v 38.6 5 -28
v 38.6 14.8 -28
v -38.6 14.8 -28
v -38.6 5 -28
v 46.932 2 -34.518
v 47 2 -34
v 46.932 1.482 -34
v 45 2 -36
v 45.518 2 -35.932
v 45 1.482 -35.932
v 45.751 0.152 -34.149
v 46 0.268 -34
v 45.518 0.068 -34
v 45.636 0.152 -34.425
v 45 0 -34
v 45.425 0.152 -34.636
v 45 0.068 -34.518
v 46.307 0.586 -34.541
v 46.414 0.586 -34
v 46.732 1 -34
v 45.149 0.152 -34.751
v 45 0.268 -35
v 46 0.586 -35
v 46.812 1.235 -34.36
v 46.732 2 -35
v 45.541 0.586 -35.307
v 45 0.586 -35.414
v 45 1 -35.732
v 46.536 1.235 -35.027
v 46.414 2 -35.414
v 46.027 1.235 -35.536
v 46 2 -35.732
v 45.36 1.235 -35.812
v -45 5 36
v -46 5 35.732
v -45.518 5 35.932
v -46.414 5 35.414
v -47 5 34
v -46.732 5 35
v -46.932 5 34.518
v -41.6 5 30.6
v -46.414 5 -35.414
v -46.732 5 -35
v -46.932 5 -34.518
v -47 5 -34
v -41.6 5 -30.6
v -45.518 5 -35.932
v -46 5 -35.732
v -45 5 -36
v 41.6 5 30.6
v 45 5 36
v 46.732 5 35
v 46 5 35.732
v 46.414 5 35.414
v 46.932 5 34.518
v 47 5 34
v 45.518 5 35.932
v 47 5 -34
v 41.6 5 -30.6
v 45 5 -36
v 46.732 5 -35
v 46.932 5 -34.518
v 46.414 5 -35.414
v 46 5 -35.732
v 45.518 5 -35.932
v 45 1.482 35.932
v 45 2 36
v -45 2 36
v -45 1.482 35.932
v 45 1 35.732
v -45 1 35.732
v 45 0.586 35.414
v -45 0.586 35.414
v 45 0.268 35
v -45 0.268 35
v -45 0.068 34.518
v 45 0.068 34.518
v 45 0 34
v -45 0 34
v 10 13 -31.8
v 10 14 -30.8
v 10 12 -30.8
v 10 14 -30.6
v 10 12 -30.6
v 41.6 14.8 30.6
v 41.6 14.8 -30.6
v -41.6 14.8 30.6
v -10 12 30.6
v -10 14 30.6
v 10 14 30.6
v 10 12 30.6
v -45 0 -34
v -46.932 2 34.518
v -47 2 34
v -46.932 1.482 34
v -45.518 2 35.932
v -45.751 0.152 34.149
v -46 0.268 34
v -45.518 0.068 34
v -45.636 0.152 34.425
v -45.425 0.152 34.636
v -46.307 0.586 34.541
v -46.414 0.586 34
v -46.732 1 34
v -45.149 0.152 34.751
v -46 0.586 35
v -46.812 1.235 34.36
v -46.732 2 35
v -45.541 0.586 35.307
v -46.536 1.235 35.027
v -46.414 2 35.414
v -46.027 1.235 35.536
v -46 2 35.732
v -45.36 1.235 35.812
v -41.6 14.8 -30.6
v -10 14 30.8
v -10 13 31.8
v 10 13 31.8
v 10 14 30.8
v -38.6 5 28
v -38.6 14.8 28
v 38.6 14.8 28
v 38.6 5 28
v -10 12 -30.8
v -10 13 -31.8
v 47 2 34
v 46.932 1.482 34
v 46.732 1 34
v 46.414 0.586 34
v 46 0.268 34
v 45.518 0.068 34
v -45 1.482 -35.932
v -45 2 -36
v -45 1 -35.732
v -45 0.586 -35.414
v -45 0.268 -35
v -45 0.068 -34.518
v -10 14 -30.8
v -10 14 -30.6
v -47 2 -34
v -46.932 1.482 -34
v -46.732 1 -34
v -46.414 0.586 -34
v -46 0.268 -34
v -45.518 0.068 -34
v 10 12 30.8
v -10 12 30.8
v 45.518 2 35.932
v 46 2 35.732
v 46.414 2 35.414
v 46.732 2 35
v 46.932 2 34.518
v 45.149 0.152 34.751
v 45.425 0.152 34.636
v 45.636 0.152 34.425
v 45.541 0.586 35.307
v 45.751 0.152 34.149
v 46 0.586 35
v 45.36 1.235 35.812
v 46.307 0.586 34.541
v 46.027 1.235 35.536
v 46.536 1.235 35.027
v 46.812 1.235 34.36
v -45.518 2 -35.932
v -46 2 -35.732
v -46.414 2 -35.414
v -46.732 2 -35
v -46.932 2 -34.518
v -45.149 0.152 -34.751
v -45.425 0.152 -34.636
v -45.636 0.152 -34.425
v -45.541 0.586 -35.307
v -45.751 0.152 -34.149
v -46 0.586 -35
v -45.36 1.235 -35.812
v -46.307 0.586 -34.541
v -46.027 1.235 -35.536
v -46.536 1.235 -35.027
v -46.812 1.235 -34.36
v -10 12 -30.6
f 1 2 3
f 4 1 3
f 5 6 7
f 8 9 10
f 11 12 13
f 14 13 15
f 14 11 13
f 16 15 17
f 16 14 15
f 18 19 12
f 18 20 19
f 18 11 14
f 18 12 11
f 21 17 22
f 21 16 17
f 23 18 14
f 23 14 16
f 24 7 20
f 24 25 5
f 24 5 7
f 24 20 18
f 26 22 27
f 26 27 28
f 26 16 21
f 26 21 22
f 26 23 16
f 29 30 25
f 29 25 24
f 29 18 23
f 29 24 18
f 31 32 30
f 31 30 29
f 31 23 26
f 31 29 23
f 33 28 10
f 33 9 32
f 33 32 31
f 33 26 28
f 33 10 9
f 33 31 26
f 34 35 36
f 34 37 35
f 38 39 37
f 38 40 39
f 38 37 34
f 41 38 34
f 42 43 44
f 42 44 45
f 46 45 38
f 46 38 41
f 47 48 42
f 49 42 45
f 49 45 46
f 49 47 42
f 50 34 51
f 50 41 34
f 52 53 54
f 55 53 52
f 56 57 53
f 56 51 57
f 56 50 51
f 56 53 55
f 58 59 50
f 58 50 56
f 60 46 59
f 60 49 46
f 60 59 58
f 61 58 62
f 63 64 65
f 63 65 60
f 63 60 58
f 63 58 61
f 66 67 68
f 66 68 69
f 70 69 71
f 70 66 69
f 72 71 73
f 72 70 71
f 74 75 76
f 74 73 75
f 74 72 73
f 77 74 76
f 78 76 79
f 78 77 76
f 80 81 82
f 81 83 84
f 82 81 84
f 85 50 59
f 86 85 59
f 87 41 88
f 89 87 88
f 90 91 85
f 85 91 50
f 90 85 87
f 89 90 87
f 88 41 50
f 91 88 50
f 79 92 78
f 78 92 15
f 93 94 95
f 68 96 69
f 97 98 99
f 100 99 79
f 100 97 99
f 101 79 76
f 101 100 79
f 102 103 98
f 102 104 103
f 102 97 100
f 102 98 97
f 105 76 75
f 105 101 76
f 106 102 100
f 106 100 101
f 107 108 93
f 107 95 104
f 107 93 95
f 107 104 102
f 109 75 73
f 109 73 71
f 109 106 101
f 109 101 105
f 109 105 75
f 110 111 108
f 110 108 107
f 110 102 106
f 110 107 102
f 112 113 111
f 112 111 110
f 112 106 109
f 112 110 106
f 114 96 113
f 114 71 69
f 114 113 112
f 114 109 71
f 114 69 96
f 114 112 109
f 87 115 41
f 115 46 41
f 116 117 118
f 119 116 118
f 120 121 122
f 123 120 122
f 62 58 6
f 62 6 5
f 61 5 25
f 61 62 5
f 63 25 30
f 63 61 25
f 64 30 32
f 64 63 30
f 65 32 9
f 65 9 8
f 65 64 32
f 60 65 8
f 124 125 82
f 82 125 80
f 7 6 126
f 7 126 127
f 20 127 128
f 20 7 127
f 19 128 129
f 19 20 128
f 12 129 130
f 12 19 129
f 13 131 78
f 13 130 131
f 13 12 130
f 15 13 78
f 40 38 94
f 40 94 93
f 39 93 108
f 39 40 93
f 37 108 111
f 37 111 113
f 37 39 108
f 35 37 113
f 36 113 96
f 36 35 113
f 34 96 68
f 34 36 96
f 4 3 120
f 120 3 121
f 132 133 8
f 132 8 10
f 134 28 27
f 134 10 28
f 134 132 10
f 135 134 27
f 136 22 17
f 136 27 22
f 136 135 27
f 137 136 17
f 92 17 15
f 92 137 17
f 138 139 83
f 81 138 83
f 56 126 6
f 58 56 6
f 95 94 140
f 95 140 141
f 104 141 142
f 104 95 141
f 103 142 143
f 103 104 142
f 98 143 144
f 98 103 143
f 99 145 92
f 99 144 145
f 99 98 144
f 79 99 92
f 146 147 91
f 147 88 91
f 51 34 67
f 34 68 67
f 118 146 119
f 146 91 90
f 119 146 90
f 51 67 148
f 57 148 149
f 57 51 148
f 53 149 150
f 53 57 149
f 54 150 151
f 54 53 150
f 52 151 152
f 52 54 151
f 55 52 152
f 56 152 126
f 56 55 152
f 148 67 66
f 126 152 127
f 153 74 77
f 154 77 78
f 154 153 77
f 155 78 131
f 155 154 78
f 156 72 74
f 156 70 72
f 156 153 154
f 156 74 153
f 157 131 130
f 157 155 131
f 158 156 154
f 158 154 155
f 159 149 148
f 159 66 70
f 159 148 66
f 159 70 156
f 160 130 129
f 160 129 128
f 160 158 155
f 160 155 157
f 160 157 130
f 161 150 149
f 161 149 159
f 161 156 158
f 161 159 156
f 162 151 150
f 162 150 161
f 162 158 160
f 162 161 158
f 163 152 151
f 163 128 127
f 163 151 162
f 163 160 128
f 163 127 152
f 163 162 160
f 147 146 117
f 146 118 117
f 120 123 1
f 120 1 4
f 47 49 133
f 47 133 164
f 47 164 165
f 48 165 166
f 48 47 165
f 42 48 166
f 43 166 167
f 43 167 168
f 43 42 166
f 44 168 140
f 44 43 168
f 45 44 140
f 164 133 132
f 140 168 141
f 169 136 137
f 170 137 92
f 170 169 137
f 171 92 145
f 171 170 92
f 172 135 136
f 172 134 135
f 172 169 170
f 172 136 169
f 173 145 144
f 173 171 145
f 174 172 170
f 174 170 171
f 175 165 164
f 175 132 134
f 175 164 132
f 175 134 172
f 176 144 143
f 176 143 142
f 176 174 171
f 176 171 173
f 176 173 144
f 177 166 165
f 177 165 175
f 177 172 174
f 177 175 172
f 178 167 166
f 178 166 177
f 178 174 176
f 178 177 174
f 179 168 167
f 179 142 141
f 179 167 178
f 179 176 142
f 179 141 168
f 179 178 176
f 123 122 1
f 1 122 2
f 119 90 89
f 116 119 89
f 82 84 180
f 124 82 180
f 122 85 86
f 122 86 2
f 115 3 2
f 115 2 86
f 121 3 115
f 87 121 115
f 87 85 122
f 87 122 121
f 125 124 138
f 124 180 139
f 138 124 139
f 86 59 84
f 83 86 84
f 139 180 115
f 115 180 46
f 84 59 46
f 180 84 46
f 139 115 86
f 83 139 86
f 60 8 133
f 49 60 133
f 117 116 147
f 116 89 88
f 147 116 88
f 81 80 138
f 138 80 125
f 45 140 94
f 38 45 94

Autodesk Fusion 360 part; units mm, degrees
sketch "Sketch1" plane through (0, 0, 0) normal (0, 1, 0) x (1, 0, 0)
  line L0 (47, 36) -> (-47, 36)
  line L1 (-47, 36) -> (-47, -36)
  line L2 (-47, -36) -> (47, -36)
  line L3 (47, -36) -> (47, 36)
  line L4 (47, 36) -> (-47, -36) construction
  line L5 (-47, 36) -> (47, -36) construction
  dimension "d1" = 72
  dimension "d2" = 94
extrude "Extrude1" add sketch "Sketch1" along normal blind 5
sketch "Sketch2" plane through (0, 5, 0) normal (0, 1, 0) x (-1, 0, 0)
  line L0 (-47, 36) -> (-47, -36)
  line L1 (-47, -36) -> (47, -36)
  line L2 (47, -36) -> (47, 36)
  line L3 (47, 36) -> (-47, 36)
  line L4 (-41.6, -30.6) -> (41.6, -30.6)
  line L5 (41.6, -30.6) -> (41.6, 30.6)
  line L6 (41.6, 30.6) -> (-41.6, 30.6)
  line L7 (-41.6, 30.6) -> (-41.6, -30.6)
  line L8 (-41.6, -30.6) -> (41.6, 30.6) construction
  line L9 (41.6, -30.6) -> (-41.6, 30.6) construction
  dimension "d5" = 83.2
  dimension "d6" = 61.2
extrude "Extrude2" add sketch "Sketch2" along normal blind 9.8 contours L4 L5 L6 L7
fillet "Fillet1" radius 2 4 edges at (47, 2.5, -36) (47, 2.5, 36) (-47, 2.5, 36) (-47, 2.5, -36)
fillet "Fillet2" radius 2 8 edges at (0, 0, -36) (-46.4142, 0, -35.4142) (-47, 0, 0) (-46.4142, 0, 35.4142) (0, 0, 36) (46.4142, 0, 35.4142) (47, 0, 0) (46.4142, 0, -35.4142)
sketch "Sketch3" plane through (0, 14.8, 0) normal (0, 1, 0) x (-1, 0, 0)
  line L0 (-41.6, 30.6) -> (-41.6, -30.6)
  line L1 (-41.6, -30.6) -> (41.6, -30.6)
  line L2 (41.6, -30.6) -> (41.6, 30.6)
  line L3 (41.6, 30.6) -> (-41.6, 30.6)
  line L4 (-38.6, -28) -> (38.6, -28)
  line L5 (38.6, -28) -> (38.6, 28)
  line L6 (38.6, 28) -> (-38.6, 28)
  line L7 (-38.6, 28) -> (-38.6, -28)
  line L8 (-38.6, -28) -> (38.6, 28) construction
  line L9 (38.6, -28) -> (-38.6, 28) construction
  line L10 (-45, -34) -> (45, -34)
  dimension "d11" = 56
  dimension "d12" = 77.2
  dimension "d13" = 90
extrude "Extrude3" cut sketch "Sketch3" against normal blind 9.8 contours L4 L5 L6 L7
sketch "Sketch4" plane through (0, 0, -30.6) normal (0, 0, -1) x (-1, 0, 0)
  line L0 (-41.6, 5) -> (41.6, 5)
  line L1 (41.6, 5) -> (41.6, 14.8)
  line L2 (41.6, 14.8) -> (-41.6, 14.8)
  line L3 (-41.6, 14.8) -> (-41.6, 5)
  line L4 (10, 14) -> (-10, 14)
  line L5 (-10, 14) -> (-10, 12)
  line L6 (-10, 12) -> (10, 12)
  line L7 (10, 12) -> (10, 14)
  line L8 (10, 14) -> (-10, 12) construction
  line L9 (-10, 14) -> (10, 12) construction
  point P0 (0, 13)
  dimension "d16" = 20
  dimension "d17" = 2
extrude "Extrude4" add sketch "Sketch4" along normal blind 1.2 contours L4 L5 L6 L7
sketch "Sketch5" plane through (10, 0, 0) normal (1, 0, 0) x (0, 0, -1)
  line L0 (30.6, 14) -> (30.6, 12)
  line L1 (30.6, 12) -> (31.8, 12)
  line L2 (31.8, 12) -> (31.8, 14)
  line L3 (31.8, 14) -> (30.6, 14)
  point P0 (31.8, 14)
  point P1 (31.8, 12)
  point P2 (31.8, 12)
  point P3 (31.8, 12)
  point P4 (31.8, 12)
  point P5 (31.8, 12)
  point P6 (31.8, 14)
  point P7 (31.8, 14)
  point P8 (31.8, 14)
  point P9 (31.8, 14)
  point P10 (31.8, 14)
  point P11 (31.8, 14)
  point P12 (31.8, 14)
  point P13 (31.8, 14)
  point P14 (31.8, 14)
  point P15 (31.8, 14)
  point P16 (31.8, 12)
  point P17 (31.8, 14)
  point P18 (31.8, 12)
  point P19 (31.8, 14)
ref_plane "WorkPlane2" through (0, 9.9, 0) normal (0, 0, 1) x (-1, 0, 0)
ref_plane "WorkPlane1" through (0, 9.9, 30.6) normal (0, 0, 1) x (1, 0, 0)
ref_plane "WorkPlane3" through (0, 13, -26.8) normal (0, 0, -1) x (-1, 0, 0)
ref_plane "WorkPlane4" through (0, 13, -26.8) normal (0, 0, -1) x (-1, 0, 0)
mirror "Mirror1" about plane through (0, 9.9, 0) normal (0, 0, 1) of "Extrude4"
chamfer "Chamfer1" distance 1 angle 45 2 edges at (0, 14, 31.8) (0, 12, 31.8)
chamfer "Chamfer2" distance 1 angle 45 2 edges at (0, 14, -31.8) (0, 12, -31.8)
sketch "Sketch6" plane through (0, 14.8, 0) normal (0, 1, 0) x (-1, 0, 0)
  line L0 (38.6, -28) -> (-38.6, -28)
  line L1 (-38.6, -28) -> (-38.6, 28)
  line L2 (-38.6, 28) -> (38.6, 28)
  line L3 (38.6, 28) -> (38.6, -28)
  line L4 (-41.6, 30.6) -> (-41.6, -30.6)
  line L5 (-41.6, -30.6) -> (41.6, -30.6)
  line L6 (41.6, -30.6) -> (41.6, 30.6)
  line L7 (41.6, 30.6) -> (-41.6, 30.6)
  point P0 (42.1144, 28)
  point P1 (-41.6, 30.6)
